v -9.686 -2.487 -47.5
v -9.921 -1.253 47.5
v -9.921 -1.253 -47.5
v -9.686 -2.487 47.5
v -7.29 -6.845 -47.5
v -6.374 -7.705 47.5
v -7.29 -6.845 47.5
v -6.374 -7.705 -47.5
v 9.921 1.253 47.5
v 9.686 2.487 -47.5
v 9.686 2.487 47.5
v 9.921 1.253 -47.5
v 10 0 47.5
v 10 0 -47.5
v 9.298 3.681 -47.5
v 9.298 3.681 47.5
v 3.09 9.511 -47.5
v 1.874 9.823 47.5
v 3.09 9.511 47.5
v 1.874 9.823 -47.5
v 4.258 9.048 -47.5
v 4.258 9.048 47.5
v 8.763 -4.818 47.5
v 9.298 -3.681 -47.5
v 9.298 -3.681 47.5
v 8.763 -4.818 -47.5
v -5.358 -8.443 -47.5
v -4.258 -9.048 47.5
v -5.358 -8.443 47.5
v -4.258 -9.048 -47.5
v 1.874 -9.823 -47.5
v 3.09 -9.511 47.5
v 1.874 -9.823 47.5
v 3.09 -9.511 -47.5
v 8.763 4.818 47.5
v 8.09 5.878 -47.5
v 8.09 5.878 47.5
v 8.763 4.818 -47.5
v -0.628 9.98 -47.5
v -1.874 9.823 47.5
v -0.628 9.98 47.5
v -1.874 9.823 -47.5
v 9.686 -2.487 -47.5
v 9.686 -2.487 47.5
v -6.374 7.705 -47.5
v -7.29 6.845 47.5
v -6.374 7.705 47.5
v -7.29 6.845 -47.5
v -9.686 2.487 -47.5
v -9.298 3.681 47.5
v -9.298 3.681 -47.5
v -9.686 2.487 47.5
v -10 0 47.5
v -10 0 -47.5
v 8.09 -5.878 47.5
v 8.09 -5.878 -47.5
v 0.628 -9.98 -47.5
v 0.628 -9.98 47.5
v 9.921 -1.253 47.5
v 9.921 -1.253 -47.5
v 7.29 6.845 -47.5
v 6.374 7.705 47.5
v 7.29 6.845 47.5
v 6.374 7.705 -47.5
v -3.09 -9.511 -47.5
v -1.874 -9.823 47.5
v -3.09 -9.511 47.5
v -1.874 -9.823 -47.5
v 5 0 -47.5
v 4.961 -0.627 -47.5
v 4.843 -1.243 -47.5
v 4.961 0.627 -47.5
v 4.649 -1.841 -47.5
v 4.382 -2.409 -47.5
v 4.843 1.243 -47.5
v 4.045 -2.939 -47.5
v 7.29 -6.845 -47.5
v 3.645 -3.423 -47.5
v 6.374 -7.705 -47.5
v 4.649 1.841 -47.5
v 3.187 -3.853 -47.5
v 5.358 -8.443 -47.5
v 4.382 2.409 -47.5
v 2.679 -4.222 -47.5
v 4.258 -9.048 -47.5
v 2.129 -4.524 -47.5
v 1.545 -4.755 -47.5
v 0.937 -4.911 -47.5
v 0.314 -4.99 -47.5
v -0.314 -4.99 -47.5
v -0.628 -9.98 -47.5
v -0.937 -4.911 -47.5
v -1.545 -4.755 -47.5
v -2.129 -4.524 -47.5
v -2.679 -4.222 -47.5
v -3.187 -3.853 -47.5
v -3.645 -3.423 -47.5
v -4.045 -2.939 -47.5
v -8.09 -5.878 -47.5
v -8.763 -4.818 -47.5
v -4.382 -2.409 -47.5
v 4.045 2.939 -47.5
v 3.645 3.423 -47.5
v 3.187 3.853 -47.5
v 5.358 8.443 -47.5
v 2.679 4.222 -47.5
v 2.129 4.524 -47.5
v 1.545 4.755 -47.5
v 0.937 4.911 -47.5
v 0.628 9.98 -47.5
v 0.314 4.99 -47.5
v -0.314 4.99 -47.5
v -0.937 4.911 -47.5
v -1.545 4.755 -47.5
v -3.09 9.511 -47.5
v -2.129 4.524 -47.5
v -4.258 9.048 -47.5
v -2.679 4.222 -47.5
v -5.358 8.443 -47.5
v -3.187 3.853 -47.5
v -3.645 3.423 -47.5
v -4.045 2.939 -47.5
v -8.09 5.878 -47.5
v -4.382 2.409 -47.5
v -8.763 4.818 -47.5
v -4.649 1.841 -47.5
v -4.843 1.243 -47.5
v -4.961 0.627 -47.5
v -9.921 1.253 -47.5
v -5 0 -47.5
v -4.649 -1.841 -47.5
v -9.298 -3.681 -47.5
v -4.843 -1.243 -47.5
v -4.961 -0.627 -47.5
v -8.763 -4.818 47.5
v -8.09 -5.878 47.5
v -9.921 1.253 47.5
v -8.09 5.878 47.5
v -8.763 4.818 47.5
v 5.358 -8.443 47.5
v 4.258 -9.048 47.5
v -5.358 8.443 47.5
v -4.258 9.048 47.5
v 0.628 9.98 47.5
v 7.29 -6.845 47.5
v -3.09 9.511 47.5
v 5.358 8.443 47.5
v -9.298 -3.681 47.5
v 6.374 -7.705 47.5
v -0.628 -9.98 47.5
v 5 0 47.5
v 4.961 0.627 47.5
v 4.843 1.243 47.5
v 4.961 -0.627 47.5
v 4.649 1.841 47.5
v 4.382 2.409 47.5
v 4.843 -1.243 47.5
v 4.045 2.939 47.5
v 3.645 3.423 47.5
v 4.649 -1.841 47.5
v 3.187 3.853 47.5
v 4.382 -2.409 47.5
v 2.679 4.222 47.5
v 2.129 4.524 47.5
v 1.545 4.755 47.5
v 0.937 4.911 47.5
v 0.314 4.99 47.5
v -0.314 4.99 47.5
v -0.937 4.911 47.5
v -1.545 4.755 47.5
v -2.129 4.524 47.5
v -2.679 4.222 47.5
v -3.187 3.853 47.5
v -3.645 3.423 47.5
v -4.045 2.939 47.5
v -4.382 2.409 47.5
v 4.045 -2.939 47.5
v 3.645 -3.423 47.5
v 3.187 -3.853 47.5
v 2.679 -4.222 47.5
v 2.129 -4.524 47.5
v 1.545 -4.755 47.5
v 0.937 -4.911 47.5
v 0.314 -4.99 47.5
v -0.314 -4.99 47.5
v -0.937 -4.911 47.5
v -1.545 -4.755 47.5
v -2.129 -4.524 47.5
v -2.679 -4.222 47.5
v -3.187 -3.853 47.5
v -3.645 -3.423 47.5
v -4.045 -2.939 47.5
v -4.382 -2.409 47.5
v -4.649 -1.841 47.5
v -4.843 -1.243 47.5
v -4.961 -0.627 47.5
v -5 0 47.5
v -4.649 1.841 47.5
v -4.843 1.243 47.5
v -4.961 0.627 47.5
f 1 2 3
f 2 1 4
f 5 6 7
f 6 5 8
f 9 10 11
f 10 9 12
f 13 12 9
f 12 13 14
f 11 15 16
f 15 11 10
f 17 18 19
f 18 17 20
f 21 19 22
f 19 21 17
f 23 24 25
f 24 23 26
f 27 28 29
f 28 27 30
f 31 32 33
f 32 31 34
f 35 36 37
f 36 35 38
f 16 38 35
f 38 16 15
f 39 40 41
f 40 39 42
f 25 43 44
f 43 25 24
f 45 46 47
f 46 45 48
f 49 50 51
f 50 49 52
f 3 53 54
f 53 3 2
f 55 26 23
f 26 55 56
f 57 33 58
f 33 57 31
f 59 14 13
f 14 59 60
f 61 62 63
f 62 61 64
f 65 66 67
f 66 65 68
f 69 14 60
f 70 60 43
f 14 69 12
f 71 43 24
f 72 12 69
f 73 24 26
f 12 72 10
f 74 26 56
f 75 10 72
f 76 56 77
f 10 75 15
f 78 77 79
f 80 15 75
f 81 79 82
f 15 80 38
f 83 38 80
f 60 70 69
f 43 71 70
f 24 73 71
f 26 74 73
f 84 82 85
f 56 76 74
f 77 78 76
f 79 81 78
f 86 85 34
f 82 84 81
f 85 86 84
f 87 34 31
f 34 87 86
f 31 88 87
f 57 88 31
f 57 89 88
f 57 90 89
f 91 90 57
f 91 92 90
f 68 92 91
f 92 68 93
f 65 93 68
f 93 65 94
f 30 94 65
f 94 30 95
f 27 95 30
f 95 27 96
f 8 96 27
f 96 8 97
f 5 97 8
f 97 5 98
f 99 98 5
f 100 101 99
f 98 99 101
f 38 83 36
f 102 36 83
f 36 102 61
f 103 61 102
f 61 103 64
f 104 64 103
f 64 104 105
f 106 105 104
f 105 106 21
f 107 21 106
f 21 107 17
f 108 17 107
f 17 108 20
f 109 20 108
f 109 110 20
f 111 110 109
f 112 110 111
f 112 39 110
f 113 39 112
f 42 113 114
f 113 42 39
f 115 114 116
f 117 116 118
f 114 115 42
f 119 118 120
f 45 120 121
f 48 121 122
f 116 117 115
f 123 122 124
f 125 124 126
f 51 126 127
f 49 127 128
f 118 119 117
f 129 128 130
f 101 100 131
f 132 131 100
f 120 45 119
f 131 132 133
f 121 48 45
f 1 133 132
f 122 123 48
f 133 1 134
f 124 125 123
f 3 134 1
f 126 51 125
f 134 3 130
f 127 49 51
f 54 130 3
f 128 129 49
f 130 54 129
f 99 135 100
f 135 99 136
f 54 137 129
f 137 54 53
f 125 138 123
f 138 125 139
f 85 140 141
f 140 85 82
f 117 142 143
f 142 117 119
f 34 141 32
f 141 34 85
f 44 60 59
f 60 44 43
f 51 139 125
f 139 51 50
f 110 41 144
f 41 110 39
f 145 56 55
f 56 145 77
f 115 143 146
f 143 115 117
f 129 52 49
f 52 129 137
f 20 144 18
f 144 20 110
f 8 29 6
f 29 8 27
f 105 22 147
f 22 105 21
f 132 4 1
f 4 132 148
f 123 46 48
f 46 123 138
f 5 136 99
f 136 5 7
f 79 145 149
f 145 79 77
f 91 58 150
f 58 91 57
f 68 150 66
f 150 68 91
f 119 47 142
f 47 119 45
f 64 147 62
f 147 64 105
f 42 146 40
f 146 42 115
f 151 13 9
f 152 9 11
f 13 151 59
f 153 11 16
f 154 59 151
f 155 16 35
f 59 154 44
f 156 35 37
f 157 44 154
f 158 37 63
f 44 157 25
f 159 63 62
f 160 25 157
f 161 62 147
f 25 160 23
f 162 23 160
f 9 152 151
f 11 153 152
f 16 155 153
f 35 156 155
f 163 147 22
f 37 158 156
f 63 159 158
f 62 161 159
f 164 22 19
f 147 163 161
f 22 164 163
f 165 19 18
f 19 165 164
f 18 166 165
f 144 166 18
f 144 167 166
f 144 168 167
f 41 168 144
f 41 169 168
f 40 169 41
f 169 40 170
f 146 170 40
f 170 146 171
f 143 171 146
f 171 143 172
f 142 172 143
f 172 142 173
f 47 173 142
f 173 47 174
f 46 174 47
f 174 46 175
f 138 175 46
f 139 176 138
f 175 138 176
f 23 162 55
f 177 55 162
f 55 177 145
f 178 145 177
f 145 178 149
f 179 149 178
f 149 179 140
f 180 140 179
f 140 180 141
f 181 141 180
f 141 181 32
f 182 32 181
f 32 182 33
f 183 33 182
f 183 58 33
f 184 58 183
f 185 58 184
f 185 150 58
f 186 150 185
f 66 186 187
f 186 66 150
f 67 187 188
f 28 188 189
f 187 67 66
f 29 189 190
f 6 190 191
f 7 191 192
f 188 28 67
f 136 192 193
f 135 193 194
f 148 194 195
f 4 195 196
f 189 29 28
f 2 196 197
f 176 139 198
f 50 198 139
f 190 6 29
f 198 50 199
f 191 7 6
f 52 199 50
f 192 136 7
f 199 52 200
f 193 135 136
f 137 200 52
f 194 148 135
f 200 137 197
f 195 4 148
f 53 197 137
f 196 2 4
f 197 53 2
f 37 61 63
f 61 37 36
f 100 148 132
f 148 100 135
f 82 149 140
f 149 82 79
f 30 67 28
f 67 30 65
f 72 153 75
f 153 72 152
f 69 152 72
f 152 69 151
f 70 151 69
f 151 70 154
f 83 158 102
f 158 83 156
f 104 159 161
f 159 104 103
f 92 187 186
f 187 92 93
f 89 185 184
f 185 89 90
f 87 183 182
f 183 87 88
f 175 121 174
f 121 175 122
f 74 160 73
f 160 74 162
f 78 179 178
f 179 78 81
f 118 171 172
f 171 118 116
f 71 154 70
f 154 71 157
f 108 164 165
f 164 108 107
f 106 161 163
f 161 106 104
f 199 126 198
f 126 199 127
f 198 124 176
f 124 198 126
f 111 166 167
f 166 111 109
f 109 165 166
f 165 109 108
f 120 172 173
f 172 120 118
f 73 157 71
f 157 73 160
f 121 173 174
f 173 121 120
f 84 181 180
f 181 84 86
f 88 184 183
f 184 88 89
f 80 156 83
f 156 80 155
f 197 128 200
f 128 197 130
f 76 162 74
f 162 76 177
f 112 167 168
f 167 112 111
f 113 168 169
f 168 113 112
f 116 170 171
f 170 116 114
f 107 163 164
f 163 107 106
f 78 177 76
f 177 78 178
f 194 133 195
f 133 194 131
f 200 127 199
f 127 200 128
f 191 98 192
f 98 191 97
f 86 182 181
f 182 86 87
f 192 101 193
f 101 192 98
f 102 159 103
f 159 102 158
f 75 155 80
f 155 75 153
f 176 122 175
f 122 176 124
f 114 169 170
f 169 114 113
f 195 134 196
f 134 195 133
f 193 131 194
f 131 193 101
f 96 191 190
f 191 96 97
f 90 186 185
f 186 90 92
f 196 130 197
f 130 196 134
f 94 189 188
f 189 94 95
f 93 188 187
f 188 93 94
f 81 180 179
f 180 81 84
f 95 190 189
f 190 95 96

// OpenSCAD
$fn = 50;


difference() {
	union() {
		translate(v = [0, 0, -47.5000000000]) {
			cylinder(h = 95, r = 10.0000000000);
		}
	}
	union() {
		translate(v = [0, 0, -100.0000000000]) {
			cylinder(h = 200, r = 5.0000000000);
		}
	}
}
